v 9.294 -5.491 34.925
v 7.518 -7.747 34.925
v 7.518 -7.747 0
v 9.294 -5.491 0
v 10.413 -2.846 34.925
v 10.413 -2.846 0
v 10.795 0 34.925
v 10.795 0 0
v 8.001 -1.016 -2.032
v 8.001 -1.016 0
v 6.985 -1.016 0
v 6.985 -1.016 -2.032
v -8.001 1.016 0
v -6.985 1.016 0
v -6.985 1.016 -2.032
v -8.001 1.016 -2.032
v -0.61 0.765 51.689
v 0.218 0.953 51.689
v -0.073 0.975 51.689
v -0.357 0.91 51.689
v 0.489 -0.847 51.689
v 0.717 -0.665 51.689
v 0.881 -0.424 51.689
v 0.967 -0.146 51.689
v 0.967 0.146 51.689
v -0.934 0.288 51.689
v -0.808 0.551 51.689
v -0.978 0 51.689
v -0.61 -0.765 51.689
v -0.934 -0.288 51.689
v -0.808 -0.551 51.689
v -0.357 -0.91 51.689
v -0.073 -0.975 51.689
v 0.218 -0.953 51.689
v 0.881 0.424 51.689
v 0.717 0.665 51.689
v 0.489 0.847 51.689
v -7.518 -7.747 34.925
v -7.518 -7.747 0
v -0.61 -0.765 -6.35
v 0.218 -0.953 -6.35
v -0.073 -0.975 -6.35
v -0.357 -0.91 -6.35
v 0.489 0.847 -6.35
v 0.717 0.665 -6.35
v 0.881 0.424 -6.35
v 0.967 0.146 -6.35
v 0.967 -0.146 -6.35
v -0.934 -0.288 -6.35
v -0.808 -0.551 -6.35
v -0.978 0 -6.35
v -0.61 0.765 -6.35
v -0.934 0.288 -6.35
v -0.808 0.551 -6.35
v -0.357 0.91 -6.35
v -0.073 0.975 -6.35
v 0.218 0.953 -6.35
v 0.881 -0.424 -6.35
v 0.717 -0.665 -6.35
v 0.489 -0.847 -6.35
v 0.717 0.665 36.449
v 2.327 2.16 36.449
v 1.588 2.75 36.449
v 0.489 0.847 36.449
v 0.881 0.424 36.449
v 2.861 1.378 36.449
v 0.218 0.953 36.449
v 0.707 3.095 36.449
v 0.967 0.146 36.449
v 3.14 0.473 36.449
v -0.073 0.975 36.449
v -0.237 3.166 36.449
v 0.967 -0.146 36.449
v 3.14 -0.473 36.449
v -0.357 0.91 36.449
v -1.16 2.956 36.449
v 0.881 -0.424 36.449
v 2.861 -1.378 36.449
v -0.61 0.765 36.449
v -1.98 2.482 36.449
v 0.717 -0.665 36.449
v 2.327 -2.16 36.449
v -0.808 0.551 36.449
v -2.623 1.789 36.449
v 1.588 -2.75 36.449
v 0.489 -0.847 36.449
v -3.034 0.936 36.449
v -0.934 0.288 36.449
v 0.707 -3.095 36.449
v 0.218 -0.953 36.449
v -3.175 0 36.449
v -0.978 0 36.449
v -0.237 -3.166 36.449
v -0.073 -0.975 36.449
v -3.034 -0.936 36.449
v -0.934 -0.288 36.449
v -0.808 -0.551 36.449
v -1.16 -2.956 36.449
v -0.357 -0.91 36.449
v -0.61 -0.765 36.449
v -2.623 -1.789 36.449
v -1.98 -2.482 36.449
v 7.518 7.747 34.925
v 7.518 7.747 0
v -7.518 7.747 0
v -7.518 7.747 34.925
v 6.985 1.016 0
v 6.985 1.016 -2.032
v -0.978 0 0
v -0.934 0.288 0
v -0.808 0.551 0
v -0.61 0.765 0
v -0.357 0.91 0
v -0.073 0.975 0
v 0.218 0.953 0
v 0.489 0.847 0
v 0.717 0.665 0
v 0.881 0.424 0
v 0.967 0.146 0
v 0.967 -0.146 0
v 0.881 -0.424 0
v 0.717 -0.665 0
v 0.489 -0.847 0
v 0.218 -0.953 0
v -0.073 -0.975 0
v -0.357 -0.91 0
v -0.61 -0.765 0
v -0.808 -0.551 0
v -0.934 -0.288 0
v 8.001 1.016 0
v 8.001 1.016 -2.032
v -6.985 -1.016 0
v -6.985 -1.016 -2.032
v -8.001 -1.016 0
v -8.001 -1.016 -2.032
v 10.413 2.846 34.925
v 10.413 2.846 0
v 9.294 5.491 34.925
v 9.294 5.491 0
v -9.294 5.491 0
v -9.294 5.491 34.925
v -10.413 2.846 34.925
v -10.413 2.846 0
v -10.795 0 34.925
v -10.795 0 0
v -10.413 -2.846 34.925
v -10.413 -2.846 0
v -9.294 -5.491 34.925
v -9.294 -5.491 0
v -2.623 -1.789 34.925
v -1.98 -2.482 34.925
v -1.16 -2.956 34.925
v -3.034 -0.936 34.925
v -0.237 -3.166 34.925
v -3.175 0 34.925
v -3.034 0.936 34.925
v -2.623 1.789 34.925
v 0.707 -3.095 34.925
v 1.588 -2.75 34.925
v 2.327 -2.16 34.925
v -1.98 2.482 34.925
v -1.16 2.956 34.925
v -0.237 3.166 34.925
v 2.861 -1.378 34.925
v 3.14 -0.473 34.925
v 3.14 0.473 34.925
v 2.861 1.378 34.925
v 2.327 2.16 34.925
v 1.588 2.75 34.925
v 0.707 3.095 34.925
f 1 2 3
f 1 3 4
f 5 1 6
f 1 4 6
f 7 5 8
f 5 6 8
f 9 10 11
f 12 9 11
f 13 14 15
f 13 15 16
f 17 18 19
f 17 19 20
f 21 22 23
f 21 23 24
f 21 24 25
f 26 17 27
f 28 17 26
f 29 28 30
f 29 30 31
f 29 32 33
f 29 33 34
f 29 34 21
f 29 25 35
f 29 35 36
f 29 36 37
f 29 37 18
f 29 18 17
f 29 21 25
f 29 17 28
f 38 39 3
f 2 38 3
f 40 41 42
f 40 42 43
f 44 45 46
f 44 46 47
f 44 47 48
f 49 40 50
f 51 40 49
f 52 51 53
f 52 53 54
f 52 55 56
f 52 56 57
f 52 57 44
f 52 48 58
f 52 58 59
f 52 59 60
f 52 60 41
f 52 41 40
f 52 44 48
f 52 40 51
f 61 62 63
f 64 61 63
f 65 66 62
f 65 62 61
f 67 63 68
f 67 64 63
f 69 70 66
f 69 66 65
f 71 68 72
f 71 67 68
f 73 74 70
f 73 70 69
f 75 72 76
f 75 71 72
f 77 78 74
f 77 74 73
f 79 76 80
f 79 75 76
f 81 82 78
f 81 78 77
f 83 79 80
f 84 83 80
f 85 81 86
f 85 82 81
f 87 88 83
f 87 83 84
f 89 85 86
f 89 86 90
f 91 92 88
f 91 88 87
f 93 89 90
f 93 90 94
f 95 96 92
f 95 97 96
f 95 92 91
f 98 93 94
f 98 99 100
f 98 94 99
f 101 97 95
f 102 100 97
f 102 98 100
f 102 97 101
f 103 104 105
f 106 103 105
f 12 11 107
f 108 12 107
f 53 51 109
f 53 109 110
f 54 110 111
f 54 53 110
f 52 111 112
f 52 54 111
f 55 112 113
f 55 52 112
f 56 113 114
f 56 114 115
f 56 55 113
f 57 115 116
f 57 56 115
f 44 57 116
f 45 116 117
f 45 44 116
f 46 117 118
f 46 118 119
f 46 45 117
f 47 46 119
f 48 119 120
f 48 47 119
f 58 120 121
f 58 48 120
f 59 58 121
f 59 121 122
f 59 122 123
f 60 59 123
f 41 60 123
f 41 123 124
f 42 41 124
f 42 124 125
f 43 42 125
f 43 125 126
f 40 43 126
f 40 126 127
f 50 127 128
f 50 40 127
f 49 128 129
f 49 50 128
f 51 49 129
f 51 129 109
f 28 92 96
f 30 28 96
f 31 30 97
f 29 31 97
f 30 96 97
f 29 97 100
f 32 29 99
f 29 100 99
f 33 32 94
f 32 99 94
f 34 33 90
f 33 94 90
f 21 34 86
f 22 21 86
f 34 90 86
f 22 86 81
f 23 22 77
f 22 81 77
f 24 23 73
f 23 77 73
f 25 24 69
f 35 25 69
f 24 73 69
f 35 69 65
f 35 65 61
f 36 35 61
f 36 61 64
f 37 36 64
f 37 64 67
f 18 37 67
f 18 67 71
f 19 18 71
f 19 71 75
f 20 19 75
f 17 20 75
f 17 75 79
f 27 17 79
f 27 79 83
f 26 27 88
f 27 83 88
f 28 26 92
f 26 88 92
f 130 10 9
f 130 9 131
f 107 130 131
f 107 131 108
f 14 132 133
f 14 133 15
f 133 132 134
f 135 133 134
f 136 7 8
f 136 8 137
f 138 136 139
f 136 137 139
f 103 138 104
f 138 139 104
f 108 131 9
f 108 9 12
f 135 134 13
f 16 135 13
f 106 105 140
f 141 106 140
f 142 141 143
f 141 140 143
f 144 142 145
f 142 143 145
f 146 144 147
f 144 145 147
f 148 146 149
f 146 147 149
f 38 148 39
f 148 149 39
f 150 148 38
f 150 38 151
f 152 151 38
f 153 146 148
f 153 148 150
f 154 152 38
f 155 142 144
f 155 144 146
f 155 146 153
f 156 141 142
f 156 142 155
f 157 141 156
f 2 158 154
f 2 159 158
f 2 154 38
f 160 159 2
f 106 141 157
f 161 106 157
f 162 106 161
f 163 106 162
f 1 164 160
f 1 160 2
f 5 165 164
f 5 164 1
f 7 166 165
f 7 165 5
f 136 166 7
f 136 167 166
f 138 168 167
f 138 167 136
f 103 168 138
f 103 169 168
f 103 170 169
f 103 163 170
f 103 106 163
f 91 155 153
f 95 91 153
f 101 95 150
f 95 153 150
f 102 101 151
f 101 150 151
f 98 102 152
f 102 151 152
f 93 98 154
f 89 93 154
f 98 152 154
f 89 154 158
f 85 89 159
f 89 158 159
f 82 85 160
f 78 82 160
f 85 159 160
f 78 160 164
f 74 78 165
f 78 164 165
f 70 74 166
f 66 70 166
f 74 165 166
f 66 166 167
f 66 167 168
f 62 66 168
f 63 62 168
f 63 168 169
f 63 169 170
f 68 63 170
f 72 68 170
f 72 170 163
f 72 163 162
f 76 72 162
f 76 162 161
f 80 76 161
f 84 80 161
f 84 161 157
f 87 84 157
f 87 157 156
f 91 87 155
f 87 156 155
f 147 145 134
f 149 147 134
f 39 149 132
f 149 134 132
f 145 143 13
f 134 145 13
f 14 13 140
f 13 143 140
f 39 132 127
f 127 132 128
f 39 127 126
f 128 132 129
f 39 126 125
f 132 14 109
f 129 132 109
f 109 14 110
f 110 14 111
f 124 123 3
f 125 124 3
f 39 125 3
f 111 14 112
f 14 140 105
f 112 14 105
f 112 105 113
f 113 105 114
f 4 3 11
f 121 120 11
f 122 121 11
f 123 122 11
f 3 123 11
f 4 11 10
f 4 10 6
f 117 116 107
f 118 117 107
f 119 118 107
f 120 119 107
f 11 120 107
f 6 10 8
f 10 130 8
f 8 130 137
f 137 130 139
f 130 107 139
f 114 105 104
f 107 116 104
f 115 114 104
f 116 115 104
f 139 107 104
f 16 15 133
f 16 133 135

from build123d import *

# Parameters (mm, degrees)
BOSS_EXTRUDE1_DEPTH = 34.925
SKETCH2_R           = 3.175
BOSS_EXTRUDE2_DEPTH = 1.524
SKETCH3_R           = 0.9779
BOSS_EXTRUDE3_DEPTH = 15.24
BOSS_EXTRUDE4_START = 6.35
SKETCH4_R           = 0.9779
BOSS_EXTRUDE4_DEPTH = 6.35
SKETCH5_W           = 1.016
SKETCH5_H           = 2.032
BOSS_EXTRUDE5_DEPTH = 2.032


with BuildPart() as part:
    # Sketch1 → Boss-Extrude1 (new body)
    with BuildSketch(Plane.XY):
        with BuildLine():
            Line((7.517713482, 7.747), (-7.517713482, 7.747))
            ThreePointArc((-7.517713482, 7.747), (-10.795, 0), (-7.517713482, -7.747))
            Line((-7.517713482, -7.747), (7.517713482, -7.747))
            ThreePointArc((7.517713482, -7.747), (9.941975207, -4.205847594), (10.795, 0))
            ThreePointArc((10.795, 0), (9.941975207, 4.205847594), (7.517713482, 7.747))
        make_face()
    extrude(amount=BOSS_EXTRUDE1_DEPTH)

    # Sketch2 → Boss-Extrude2 (add)
    with BuildSketch(Plane.XY.offset(34.925)):
        with Locations(Location((0, 0, 0), (0, 0, 180))):
            Circle(SKETCH2_R)
    extrude(amount=BOSS_EXTRUDE2_DEPTH)

    # Sketch3 → Boss-Extrude3 (add)
    with BuildSketch(Plane.XY.offset(36.449)):
        with Locations(Location((0, 0, 0), (0, 0, 180))):
            Circle(SKETCH3_R)
    extrude(amount=BOSS_EXTRUDE3_DEPTH)

    # Sketch4 → Boss-Extrude4 (add)
    with BuildSketch(Plane(origin=(0, 0, 0), x_dir=(-1, 0, 0), z_dir=(0, 0, -1)).offset(BOSS_EXTRUDE4_START)):
        Circle(SKETCH4_R)
    extrude(amount=-BOSS_EXTRUDE4_DEPTH)

    # Sketch5 → Boss-Extrude5 (add)
    with BuildSketch(Plane(origin=(0, 0, 0), x_dir=(-1, 0, 0), z_dir=(0, 0, -1))):
        with Locations((-7.493, 0)):
            Rectangle(SKETCH5_W, SKETCH5_H)
        with Locations((7.493, 0)):
            Rectangle(SKETCH5_W, SKETCH5_H)
    extrude(amount=BOSS_EXTRUDE5_DEPTH)


solid = part.part
